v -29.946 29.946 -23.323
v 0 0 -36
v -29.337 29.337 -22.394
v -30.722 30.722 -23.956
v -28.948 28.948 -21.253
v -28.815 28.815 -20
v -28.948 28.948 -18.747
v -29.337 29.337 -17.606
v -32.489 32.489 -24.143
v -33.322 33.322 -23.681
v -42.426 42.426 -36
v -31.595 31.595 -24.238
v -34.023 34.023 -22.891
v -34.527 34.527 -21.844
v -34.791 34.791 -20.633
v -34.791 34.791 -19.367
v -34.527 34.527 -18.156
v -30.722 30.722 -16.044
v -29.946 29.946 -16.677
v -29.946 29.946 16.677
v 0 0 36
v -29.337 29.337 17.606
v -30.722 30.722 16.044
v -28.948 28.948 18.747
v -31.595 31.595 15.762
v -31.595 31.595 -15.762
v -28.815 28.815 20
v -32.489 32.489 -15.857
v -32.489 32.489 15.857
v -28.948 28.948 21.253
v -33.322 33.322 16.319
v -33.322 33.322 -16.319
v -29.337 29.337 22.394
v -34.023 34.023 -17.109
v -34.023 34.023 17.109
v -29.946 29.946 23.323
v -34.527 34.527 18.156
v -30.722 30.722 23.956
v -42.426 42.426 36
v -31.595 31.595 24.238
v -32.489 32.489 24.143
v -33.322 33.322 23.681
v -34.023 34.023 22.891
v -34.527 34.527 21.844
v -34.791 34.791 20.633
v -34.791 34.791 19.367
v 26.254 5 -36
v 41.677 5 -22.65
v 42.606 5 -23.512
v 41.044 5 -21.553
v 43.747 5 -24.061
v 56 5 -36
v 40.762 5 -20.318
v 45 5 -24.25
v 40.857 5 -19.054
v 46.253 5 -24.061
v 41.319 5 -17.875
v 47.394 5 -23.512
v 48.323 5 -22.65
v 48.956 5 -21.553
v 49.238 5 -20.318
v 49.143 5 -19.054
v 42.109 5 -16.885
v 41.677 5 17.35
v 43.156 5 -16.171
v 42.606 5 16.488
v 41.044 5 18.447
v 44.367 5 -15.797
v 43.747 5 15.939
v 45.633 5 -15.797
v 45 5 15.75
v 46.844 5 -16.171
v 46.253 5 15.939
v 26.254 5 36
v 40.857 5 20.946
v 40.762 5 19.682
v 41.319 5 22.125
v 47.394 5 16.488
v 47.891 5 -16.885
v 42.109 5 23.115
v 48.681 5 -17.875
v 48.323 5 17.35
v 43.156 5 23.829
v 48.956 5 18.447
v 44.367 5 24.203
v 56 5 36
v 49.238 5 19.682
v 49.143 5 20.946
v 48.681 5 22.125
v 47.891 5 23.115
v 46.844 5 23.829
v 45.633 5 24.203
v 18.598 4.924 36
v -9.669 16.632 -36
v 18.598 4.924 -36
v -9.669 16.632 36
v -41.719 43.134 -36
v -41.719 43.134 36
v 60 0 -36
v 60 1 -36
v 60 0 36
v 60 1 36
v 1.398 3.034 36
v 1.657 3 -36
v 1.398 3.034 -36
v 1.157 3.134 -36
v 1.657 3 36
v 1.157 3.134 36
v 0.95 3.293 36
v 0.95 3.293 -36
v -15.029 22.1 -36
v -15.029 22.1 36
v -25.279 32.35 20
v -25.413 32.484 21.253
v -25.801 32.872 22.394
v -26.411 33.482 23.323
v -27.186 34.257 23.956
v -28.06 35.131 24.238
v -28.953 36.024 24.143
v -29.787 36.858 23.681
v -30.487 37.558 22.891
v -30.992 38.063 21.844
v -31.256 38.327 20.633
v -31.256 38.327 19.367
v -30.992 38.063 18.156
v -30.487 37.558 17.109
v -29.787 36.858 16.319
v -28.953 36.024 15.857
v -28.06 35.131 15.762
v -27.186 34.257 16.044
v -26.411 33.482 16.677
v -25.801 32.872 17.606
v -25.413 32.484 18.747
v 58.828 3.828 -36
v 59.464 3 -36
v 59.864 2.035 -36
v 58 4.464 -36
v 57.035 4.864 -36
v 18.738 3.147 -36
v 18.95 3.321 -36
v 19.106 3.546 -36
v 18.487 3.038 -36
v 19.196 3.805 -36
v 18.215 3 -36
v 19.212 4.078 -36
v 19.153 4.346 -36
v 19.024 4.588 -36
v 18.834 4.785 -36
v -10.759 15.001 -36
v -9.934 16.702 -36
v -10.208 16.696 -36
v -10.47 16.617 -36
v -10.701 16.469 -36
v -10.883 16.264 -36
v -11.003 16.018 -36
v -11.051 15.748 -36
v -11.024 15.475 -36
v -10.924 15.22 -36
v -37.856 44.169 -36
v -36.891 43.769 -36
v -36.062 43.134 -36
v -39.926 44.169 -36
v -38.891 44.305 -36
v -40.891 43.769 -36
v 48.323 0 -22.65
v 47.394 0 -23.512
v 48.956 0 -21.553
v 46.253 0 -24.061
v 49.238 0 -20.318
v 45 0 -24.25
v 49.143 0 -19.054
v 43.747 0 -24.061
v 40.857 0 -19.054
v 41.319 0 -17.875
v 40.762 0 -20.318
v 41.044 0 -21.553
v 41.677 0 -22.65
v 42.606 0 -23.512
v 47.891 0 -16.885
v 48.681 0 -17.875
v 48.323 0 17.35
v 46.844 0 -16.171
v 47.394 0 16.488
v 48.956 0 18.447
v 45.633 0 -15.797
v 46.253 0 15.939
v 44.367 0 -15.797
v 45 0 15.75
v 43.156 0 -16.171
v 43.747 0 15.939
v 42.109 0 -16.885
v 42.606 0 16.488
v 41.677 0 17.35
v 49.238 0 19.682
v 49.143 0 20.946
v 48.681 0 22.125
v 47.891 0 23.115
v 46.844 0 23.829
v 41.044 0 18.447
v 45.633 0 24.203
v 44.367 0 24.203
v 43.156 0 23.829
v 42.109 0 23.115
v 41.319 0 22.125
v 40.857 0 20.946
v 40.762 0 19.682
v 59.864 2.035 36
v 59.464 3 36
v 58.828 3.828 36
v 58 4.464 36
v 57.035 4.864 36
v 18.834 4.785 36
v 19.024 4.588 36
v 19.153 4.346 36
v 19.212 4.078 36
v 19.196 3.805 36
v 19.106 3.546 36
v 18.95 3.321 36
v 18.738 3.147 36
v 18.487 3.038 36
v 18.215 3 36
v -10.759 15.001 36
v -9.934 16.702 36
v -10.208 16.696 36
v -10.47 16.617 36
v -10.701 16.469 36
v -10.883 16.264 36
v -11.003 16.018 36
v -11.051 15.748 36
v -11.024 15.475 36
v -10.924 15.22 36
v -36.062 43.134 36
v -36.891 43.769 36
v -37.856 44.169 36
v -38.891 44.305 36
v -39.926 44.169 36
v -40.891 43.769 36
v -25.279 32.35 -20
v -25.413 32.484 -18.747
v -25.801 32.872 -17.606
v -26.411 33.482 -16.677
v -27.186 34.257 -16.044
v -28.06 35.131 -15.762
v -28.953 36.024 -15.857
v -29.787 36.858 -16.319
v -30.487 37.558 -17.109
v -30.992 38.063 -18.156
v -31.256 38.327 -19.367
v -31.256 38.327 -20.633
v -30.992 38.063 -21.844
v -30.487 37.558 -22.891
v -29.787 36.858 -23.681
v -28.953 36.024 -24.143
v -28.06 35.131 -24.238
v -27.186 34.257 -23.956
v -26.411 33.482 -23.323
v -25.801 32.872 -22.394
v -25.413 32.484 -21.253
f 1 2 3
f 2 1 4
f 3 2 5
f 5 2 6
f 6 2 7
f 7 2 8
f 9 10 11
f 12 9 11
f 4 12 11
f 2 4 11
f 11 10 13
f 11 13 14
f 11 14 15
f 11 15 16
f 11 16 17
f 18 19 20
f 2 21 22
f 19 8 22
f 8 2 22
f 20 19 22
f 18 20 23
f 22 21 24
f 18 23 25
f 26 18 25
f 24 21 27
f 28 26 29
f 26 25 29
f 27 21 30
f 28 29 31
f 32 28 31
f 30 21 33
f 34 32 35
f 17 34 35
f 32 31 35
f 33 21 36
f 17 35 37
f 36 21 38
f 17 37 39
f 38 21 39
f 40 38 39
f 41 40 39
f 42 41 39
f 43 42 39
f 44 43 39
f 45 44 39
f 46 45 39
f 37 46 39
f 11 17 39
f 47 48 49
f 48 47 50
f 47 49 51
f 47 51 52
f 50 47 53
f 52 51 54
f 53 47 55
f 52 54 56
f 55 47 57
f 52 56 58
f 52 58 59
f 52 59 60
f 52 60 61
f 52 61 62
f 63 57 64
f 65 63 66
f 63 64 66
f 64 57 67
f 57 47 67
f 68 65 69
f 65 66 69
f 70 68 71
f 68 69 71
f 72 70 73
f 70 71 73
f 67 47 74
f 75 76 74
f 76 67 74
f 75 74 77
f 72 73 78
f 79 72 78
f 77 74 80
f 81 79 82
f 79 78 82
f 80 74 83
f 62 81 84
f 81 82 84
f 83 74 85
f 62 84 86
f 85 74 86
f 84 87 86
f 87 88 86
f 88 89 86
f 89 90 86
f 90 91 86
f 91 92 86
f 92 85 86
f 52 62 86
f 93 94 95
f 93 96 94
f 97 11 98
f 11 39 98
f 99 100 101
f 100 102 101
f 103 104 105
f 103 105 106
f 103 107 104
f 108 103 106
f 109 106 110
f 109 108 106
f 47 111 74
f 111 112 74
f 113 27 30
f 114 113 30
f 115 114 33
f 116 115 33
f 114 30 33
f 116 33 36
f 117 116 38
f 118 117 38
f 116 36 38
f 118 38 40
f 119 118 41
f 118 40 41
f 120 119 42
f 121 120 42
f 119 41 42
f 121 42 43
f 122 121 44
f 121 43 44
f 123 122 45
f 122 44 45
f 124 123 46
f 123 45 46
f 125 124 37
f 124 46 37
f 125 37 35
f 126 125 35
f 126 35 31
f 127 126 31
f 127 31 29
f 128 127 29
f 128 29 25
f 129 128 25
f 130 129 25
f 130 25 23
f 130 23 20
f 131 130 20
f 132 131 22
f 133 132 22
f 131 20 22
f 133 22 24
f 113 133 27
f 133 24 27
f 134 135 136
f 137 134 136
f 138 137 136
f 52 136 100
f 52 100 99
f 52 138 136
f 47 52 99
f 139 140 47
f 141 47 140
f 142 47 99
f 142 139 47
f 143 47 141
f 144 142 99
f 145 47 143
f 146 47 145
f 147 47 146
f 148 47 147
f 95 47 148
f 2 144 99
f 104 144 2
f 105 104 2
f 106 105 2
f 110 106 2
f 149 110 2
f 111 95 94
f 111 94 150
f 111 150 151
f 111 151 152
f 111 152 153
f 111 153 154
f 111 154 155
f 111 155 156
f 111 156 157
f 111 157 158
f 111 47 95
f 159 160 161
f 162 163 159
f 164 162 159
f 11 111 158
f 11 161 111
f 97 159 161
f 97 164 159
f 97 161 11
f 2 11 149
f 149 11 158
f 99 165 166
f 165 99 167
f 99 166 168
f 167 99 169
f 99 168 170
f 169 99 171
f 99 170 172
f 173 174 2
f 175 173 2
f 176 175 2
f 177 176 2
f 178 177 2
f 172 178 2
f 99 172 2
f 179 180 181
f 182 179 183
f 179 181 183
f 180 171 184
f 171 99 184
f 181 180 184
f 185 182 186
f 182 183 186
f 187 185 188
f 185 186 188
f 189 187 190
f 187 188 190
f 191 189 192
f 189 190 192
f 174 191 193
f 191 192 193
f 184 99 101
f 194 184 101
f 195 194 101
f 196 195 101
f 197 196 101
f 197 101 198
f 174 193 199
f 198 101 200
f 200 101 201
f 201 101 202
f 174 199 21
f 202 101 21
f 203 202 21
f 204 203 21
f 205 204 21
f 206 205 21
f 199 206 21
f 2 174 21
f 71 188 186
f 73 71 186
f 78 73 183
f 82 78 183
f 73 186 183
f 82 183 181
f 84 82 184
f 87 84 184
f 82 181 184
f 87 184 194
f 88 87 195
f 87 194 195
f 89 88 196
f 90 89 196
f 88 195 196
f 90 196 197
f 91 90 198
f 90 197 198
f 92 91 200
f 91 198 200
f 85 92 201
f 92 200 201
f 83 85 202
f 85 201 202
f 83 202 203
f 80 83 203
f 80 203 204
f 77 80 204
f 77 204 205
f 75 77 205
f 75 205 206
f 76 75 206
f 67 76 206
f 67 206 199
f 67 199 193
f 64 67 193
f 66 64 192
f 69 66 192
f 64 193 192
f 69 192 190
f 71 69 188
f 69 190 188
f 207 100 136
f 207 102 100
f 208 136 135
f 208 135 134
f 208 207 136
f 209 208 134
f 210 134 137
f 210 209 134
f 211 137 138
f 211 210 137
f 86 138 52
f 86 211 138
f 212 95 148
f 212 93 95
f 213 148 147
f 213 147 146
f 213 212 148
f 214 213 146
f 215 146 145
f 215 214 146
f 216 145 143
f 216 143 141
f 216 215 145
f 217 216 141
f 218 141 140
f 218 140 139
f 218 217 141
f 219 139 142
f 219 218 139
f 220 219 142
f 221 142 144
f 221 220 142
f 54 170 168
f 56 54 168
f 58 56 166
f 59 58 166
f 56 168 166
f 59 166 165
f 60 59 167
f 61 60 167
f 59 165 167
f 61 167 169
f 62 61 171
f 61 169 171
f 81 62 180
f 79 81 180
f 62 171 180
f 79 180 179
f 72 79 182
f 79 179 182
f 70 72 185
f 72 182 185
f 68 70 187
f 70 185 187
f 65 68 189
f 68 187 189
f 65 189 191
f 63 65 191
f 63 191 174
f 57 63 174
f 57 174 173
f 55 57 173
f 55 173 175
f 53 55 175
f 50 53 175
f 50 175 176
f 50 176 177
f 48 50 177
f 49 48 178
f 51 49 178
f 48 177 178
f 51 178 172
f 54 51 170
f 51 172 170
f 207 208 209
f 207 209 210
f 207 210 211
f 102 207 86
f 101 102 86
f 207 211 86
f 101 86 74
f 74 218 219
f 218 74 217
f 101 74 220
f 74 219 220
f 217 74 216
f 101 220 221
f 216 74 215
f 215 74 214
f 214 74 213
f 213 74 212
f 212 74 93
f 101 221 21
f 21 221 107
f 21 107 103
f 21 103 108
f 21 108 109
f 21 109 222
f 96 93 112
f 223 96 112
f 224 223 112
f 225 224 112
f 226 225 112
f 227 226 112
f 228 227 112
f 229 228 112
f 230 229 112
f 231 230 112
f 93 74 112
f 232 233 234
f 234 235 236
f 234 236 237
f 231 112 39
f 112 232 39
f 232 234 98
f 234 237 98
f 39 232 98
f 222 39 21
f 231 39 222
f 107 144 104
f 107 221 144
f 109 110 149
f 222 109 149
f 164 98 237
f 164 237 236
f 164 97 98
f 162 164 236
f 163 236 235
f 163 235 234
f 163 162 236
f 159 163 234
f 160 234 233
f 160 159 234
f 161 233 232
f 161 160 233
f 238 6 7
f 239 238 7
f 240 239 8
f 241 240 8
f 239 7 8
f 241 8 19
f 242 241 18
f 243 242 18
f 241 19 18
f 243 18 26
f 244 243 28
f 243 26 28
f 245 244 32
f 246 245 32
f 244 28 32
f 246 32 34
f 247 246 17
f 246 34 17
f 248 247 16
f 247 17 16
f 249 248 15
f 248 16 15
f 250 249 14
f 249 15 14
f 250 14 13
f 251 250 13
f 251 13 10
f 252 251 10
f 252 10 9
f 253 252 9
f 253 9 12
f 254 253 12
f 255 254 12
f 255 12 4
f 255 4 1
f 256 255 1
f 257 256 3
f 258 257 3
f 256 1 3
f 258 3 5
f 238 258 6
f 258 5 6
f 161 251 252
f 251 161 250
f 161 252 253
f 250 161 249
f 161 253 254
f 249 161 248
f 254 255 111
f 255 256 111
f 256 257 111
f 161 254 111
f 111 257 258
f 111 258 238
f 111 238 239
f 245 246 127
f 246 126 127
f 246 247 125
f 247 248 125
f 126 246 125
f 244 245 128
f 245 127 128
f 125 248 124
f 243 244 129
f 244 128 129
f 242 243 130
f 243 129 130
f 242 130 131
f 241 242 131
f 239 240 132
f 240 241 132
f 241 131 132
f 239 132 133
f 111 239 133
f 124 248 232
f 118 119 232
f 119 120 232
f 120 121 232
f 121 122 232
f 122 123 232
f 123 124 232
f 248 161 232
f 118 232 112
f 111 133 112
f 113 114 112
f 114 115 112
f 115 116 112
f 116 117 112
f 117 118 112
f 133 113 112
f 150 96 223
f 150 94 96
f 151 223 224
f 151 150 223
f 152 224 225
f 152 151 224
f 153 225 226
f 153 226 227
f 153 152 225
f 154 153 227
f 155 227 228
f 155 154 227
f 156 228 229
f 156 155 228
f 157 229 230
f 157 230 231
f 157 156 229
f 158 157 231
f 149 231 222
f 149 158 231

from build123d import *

# Parameters (mm, degrees)
EXTRUDE_1_DEPTH     = 36
SKETCH_2_R          = 4.25
CUT_EXTRUDE_1_DEPTH = 5
SKETCH_3_R          = 4.25
CUT_EXTRUDE_2_DEPTH = 5
FILLET_1_R          = 4
FILLET_2_R          = 1


with BuildPart() as part:
    # Эскиз1 → Бобышка-Вытянуть1 (new body, symmetric)
    with BuildSketch(Plane.XY):
        Polygon((0, 0), (-42.426406871, 42.426406871), (-38.890872965, 45.961940777), (-15.028558569, 22.099626381), (26.253591352, 5), (60, 5), (60, 0), align=None)
        Polygon((-14.313708499, 18.556349186), (23.242640687, 3), (1.242640687, 3), align=None, mode=Mode.SUBTRACT)
    extrude(amount=EXTRUDE_1_DEPTH, both=True)

    # Эскиз2 → Вырез-Вытянуть1 (cut)
    with BuildSketch(Plane(origin=(0, 0, 0), x_dir=(0, 0, 1), z_dir=(-0.707106781, -0.707106781, 0))):
        with Locations(Location((-20, 45, 0), (0, 0, 270))):  # turned: the seam where the file's is
            Circle(SKETCH_2_R)
        with Locations(Location((20, 45, 0), (0, 0, 270))):  # turned: the seam where the file's is
            Circle(SKETCH_2_R)
    extrude(amount=-CUT_EXTRUDE_1_DEPTH, mode=Mode.SUBTRACT)

    # Эскиз3 → Вырез-Вытянуть2 (cut)
    with BuildSketch(Plane.XZ):
        with Locations(Location((45, 20, 0), (0, 0, 270))):  # turned: the seam where the file's is
            Circle(SKETCH_3_R)
        with Locations(Location((45, -20, 0), (0, 0, 270))):  # turned: the seam where the file's is
            Circle(SKETCH_3_R)
    extrude(amount=-CUT_EXTRUDE_2_DEPTH, mode=Mode.SUBTRACT)

    # Скругление1
    fillet_1_edges = [part.edges().sort_by_distance(p)[0] for p in [
        (-38.890872965, 45.961940777, 0),
        (60, 5, 0),
    ]]
    fillet(fillet_1_edges, radius=FILLET_1_R)

    # Скругление2
    fillet_2_edges = [part.edges().sort_by_distance(p)[0] for p in [
        (-14.313708499, 18.556349186, 0),
        (1.242640687, 3, 0),
        (23.242640687, 3, 0),
    ]]
    fillet(fillet_2_edges, radius=FILLET_2_R)


solid = part.part
